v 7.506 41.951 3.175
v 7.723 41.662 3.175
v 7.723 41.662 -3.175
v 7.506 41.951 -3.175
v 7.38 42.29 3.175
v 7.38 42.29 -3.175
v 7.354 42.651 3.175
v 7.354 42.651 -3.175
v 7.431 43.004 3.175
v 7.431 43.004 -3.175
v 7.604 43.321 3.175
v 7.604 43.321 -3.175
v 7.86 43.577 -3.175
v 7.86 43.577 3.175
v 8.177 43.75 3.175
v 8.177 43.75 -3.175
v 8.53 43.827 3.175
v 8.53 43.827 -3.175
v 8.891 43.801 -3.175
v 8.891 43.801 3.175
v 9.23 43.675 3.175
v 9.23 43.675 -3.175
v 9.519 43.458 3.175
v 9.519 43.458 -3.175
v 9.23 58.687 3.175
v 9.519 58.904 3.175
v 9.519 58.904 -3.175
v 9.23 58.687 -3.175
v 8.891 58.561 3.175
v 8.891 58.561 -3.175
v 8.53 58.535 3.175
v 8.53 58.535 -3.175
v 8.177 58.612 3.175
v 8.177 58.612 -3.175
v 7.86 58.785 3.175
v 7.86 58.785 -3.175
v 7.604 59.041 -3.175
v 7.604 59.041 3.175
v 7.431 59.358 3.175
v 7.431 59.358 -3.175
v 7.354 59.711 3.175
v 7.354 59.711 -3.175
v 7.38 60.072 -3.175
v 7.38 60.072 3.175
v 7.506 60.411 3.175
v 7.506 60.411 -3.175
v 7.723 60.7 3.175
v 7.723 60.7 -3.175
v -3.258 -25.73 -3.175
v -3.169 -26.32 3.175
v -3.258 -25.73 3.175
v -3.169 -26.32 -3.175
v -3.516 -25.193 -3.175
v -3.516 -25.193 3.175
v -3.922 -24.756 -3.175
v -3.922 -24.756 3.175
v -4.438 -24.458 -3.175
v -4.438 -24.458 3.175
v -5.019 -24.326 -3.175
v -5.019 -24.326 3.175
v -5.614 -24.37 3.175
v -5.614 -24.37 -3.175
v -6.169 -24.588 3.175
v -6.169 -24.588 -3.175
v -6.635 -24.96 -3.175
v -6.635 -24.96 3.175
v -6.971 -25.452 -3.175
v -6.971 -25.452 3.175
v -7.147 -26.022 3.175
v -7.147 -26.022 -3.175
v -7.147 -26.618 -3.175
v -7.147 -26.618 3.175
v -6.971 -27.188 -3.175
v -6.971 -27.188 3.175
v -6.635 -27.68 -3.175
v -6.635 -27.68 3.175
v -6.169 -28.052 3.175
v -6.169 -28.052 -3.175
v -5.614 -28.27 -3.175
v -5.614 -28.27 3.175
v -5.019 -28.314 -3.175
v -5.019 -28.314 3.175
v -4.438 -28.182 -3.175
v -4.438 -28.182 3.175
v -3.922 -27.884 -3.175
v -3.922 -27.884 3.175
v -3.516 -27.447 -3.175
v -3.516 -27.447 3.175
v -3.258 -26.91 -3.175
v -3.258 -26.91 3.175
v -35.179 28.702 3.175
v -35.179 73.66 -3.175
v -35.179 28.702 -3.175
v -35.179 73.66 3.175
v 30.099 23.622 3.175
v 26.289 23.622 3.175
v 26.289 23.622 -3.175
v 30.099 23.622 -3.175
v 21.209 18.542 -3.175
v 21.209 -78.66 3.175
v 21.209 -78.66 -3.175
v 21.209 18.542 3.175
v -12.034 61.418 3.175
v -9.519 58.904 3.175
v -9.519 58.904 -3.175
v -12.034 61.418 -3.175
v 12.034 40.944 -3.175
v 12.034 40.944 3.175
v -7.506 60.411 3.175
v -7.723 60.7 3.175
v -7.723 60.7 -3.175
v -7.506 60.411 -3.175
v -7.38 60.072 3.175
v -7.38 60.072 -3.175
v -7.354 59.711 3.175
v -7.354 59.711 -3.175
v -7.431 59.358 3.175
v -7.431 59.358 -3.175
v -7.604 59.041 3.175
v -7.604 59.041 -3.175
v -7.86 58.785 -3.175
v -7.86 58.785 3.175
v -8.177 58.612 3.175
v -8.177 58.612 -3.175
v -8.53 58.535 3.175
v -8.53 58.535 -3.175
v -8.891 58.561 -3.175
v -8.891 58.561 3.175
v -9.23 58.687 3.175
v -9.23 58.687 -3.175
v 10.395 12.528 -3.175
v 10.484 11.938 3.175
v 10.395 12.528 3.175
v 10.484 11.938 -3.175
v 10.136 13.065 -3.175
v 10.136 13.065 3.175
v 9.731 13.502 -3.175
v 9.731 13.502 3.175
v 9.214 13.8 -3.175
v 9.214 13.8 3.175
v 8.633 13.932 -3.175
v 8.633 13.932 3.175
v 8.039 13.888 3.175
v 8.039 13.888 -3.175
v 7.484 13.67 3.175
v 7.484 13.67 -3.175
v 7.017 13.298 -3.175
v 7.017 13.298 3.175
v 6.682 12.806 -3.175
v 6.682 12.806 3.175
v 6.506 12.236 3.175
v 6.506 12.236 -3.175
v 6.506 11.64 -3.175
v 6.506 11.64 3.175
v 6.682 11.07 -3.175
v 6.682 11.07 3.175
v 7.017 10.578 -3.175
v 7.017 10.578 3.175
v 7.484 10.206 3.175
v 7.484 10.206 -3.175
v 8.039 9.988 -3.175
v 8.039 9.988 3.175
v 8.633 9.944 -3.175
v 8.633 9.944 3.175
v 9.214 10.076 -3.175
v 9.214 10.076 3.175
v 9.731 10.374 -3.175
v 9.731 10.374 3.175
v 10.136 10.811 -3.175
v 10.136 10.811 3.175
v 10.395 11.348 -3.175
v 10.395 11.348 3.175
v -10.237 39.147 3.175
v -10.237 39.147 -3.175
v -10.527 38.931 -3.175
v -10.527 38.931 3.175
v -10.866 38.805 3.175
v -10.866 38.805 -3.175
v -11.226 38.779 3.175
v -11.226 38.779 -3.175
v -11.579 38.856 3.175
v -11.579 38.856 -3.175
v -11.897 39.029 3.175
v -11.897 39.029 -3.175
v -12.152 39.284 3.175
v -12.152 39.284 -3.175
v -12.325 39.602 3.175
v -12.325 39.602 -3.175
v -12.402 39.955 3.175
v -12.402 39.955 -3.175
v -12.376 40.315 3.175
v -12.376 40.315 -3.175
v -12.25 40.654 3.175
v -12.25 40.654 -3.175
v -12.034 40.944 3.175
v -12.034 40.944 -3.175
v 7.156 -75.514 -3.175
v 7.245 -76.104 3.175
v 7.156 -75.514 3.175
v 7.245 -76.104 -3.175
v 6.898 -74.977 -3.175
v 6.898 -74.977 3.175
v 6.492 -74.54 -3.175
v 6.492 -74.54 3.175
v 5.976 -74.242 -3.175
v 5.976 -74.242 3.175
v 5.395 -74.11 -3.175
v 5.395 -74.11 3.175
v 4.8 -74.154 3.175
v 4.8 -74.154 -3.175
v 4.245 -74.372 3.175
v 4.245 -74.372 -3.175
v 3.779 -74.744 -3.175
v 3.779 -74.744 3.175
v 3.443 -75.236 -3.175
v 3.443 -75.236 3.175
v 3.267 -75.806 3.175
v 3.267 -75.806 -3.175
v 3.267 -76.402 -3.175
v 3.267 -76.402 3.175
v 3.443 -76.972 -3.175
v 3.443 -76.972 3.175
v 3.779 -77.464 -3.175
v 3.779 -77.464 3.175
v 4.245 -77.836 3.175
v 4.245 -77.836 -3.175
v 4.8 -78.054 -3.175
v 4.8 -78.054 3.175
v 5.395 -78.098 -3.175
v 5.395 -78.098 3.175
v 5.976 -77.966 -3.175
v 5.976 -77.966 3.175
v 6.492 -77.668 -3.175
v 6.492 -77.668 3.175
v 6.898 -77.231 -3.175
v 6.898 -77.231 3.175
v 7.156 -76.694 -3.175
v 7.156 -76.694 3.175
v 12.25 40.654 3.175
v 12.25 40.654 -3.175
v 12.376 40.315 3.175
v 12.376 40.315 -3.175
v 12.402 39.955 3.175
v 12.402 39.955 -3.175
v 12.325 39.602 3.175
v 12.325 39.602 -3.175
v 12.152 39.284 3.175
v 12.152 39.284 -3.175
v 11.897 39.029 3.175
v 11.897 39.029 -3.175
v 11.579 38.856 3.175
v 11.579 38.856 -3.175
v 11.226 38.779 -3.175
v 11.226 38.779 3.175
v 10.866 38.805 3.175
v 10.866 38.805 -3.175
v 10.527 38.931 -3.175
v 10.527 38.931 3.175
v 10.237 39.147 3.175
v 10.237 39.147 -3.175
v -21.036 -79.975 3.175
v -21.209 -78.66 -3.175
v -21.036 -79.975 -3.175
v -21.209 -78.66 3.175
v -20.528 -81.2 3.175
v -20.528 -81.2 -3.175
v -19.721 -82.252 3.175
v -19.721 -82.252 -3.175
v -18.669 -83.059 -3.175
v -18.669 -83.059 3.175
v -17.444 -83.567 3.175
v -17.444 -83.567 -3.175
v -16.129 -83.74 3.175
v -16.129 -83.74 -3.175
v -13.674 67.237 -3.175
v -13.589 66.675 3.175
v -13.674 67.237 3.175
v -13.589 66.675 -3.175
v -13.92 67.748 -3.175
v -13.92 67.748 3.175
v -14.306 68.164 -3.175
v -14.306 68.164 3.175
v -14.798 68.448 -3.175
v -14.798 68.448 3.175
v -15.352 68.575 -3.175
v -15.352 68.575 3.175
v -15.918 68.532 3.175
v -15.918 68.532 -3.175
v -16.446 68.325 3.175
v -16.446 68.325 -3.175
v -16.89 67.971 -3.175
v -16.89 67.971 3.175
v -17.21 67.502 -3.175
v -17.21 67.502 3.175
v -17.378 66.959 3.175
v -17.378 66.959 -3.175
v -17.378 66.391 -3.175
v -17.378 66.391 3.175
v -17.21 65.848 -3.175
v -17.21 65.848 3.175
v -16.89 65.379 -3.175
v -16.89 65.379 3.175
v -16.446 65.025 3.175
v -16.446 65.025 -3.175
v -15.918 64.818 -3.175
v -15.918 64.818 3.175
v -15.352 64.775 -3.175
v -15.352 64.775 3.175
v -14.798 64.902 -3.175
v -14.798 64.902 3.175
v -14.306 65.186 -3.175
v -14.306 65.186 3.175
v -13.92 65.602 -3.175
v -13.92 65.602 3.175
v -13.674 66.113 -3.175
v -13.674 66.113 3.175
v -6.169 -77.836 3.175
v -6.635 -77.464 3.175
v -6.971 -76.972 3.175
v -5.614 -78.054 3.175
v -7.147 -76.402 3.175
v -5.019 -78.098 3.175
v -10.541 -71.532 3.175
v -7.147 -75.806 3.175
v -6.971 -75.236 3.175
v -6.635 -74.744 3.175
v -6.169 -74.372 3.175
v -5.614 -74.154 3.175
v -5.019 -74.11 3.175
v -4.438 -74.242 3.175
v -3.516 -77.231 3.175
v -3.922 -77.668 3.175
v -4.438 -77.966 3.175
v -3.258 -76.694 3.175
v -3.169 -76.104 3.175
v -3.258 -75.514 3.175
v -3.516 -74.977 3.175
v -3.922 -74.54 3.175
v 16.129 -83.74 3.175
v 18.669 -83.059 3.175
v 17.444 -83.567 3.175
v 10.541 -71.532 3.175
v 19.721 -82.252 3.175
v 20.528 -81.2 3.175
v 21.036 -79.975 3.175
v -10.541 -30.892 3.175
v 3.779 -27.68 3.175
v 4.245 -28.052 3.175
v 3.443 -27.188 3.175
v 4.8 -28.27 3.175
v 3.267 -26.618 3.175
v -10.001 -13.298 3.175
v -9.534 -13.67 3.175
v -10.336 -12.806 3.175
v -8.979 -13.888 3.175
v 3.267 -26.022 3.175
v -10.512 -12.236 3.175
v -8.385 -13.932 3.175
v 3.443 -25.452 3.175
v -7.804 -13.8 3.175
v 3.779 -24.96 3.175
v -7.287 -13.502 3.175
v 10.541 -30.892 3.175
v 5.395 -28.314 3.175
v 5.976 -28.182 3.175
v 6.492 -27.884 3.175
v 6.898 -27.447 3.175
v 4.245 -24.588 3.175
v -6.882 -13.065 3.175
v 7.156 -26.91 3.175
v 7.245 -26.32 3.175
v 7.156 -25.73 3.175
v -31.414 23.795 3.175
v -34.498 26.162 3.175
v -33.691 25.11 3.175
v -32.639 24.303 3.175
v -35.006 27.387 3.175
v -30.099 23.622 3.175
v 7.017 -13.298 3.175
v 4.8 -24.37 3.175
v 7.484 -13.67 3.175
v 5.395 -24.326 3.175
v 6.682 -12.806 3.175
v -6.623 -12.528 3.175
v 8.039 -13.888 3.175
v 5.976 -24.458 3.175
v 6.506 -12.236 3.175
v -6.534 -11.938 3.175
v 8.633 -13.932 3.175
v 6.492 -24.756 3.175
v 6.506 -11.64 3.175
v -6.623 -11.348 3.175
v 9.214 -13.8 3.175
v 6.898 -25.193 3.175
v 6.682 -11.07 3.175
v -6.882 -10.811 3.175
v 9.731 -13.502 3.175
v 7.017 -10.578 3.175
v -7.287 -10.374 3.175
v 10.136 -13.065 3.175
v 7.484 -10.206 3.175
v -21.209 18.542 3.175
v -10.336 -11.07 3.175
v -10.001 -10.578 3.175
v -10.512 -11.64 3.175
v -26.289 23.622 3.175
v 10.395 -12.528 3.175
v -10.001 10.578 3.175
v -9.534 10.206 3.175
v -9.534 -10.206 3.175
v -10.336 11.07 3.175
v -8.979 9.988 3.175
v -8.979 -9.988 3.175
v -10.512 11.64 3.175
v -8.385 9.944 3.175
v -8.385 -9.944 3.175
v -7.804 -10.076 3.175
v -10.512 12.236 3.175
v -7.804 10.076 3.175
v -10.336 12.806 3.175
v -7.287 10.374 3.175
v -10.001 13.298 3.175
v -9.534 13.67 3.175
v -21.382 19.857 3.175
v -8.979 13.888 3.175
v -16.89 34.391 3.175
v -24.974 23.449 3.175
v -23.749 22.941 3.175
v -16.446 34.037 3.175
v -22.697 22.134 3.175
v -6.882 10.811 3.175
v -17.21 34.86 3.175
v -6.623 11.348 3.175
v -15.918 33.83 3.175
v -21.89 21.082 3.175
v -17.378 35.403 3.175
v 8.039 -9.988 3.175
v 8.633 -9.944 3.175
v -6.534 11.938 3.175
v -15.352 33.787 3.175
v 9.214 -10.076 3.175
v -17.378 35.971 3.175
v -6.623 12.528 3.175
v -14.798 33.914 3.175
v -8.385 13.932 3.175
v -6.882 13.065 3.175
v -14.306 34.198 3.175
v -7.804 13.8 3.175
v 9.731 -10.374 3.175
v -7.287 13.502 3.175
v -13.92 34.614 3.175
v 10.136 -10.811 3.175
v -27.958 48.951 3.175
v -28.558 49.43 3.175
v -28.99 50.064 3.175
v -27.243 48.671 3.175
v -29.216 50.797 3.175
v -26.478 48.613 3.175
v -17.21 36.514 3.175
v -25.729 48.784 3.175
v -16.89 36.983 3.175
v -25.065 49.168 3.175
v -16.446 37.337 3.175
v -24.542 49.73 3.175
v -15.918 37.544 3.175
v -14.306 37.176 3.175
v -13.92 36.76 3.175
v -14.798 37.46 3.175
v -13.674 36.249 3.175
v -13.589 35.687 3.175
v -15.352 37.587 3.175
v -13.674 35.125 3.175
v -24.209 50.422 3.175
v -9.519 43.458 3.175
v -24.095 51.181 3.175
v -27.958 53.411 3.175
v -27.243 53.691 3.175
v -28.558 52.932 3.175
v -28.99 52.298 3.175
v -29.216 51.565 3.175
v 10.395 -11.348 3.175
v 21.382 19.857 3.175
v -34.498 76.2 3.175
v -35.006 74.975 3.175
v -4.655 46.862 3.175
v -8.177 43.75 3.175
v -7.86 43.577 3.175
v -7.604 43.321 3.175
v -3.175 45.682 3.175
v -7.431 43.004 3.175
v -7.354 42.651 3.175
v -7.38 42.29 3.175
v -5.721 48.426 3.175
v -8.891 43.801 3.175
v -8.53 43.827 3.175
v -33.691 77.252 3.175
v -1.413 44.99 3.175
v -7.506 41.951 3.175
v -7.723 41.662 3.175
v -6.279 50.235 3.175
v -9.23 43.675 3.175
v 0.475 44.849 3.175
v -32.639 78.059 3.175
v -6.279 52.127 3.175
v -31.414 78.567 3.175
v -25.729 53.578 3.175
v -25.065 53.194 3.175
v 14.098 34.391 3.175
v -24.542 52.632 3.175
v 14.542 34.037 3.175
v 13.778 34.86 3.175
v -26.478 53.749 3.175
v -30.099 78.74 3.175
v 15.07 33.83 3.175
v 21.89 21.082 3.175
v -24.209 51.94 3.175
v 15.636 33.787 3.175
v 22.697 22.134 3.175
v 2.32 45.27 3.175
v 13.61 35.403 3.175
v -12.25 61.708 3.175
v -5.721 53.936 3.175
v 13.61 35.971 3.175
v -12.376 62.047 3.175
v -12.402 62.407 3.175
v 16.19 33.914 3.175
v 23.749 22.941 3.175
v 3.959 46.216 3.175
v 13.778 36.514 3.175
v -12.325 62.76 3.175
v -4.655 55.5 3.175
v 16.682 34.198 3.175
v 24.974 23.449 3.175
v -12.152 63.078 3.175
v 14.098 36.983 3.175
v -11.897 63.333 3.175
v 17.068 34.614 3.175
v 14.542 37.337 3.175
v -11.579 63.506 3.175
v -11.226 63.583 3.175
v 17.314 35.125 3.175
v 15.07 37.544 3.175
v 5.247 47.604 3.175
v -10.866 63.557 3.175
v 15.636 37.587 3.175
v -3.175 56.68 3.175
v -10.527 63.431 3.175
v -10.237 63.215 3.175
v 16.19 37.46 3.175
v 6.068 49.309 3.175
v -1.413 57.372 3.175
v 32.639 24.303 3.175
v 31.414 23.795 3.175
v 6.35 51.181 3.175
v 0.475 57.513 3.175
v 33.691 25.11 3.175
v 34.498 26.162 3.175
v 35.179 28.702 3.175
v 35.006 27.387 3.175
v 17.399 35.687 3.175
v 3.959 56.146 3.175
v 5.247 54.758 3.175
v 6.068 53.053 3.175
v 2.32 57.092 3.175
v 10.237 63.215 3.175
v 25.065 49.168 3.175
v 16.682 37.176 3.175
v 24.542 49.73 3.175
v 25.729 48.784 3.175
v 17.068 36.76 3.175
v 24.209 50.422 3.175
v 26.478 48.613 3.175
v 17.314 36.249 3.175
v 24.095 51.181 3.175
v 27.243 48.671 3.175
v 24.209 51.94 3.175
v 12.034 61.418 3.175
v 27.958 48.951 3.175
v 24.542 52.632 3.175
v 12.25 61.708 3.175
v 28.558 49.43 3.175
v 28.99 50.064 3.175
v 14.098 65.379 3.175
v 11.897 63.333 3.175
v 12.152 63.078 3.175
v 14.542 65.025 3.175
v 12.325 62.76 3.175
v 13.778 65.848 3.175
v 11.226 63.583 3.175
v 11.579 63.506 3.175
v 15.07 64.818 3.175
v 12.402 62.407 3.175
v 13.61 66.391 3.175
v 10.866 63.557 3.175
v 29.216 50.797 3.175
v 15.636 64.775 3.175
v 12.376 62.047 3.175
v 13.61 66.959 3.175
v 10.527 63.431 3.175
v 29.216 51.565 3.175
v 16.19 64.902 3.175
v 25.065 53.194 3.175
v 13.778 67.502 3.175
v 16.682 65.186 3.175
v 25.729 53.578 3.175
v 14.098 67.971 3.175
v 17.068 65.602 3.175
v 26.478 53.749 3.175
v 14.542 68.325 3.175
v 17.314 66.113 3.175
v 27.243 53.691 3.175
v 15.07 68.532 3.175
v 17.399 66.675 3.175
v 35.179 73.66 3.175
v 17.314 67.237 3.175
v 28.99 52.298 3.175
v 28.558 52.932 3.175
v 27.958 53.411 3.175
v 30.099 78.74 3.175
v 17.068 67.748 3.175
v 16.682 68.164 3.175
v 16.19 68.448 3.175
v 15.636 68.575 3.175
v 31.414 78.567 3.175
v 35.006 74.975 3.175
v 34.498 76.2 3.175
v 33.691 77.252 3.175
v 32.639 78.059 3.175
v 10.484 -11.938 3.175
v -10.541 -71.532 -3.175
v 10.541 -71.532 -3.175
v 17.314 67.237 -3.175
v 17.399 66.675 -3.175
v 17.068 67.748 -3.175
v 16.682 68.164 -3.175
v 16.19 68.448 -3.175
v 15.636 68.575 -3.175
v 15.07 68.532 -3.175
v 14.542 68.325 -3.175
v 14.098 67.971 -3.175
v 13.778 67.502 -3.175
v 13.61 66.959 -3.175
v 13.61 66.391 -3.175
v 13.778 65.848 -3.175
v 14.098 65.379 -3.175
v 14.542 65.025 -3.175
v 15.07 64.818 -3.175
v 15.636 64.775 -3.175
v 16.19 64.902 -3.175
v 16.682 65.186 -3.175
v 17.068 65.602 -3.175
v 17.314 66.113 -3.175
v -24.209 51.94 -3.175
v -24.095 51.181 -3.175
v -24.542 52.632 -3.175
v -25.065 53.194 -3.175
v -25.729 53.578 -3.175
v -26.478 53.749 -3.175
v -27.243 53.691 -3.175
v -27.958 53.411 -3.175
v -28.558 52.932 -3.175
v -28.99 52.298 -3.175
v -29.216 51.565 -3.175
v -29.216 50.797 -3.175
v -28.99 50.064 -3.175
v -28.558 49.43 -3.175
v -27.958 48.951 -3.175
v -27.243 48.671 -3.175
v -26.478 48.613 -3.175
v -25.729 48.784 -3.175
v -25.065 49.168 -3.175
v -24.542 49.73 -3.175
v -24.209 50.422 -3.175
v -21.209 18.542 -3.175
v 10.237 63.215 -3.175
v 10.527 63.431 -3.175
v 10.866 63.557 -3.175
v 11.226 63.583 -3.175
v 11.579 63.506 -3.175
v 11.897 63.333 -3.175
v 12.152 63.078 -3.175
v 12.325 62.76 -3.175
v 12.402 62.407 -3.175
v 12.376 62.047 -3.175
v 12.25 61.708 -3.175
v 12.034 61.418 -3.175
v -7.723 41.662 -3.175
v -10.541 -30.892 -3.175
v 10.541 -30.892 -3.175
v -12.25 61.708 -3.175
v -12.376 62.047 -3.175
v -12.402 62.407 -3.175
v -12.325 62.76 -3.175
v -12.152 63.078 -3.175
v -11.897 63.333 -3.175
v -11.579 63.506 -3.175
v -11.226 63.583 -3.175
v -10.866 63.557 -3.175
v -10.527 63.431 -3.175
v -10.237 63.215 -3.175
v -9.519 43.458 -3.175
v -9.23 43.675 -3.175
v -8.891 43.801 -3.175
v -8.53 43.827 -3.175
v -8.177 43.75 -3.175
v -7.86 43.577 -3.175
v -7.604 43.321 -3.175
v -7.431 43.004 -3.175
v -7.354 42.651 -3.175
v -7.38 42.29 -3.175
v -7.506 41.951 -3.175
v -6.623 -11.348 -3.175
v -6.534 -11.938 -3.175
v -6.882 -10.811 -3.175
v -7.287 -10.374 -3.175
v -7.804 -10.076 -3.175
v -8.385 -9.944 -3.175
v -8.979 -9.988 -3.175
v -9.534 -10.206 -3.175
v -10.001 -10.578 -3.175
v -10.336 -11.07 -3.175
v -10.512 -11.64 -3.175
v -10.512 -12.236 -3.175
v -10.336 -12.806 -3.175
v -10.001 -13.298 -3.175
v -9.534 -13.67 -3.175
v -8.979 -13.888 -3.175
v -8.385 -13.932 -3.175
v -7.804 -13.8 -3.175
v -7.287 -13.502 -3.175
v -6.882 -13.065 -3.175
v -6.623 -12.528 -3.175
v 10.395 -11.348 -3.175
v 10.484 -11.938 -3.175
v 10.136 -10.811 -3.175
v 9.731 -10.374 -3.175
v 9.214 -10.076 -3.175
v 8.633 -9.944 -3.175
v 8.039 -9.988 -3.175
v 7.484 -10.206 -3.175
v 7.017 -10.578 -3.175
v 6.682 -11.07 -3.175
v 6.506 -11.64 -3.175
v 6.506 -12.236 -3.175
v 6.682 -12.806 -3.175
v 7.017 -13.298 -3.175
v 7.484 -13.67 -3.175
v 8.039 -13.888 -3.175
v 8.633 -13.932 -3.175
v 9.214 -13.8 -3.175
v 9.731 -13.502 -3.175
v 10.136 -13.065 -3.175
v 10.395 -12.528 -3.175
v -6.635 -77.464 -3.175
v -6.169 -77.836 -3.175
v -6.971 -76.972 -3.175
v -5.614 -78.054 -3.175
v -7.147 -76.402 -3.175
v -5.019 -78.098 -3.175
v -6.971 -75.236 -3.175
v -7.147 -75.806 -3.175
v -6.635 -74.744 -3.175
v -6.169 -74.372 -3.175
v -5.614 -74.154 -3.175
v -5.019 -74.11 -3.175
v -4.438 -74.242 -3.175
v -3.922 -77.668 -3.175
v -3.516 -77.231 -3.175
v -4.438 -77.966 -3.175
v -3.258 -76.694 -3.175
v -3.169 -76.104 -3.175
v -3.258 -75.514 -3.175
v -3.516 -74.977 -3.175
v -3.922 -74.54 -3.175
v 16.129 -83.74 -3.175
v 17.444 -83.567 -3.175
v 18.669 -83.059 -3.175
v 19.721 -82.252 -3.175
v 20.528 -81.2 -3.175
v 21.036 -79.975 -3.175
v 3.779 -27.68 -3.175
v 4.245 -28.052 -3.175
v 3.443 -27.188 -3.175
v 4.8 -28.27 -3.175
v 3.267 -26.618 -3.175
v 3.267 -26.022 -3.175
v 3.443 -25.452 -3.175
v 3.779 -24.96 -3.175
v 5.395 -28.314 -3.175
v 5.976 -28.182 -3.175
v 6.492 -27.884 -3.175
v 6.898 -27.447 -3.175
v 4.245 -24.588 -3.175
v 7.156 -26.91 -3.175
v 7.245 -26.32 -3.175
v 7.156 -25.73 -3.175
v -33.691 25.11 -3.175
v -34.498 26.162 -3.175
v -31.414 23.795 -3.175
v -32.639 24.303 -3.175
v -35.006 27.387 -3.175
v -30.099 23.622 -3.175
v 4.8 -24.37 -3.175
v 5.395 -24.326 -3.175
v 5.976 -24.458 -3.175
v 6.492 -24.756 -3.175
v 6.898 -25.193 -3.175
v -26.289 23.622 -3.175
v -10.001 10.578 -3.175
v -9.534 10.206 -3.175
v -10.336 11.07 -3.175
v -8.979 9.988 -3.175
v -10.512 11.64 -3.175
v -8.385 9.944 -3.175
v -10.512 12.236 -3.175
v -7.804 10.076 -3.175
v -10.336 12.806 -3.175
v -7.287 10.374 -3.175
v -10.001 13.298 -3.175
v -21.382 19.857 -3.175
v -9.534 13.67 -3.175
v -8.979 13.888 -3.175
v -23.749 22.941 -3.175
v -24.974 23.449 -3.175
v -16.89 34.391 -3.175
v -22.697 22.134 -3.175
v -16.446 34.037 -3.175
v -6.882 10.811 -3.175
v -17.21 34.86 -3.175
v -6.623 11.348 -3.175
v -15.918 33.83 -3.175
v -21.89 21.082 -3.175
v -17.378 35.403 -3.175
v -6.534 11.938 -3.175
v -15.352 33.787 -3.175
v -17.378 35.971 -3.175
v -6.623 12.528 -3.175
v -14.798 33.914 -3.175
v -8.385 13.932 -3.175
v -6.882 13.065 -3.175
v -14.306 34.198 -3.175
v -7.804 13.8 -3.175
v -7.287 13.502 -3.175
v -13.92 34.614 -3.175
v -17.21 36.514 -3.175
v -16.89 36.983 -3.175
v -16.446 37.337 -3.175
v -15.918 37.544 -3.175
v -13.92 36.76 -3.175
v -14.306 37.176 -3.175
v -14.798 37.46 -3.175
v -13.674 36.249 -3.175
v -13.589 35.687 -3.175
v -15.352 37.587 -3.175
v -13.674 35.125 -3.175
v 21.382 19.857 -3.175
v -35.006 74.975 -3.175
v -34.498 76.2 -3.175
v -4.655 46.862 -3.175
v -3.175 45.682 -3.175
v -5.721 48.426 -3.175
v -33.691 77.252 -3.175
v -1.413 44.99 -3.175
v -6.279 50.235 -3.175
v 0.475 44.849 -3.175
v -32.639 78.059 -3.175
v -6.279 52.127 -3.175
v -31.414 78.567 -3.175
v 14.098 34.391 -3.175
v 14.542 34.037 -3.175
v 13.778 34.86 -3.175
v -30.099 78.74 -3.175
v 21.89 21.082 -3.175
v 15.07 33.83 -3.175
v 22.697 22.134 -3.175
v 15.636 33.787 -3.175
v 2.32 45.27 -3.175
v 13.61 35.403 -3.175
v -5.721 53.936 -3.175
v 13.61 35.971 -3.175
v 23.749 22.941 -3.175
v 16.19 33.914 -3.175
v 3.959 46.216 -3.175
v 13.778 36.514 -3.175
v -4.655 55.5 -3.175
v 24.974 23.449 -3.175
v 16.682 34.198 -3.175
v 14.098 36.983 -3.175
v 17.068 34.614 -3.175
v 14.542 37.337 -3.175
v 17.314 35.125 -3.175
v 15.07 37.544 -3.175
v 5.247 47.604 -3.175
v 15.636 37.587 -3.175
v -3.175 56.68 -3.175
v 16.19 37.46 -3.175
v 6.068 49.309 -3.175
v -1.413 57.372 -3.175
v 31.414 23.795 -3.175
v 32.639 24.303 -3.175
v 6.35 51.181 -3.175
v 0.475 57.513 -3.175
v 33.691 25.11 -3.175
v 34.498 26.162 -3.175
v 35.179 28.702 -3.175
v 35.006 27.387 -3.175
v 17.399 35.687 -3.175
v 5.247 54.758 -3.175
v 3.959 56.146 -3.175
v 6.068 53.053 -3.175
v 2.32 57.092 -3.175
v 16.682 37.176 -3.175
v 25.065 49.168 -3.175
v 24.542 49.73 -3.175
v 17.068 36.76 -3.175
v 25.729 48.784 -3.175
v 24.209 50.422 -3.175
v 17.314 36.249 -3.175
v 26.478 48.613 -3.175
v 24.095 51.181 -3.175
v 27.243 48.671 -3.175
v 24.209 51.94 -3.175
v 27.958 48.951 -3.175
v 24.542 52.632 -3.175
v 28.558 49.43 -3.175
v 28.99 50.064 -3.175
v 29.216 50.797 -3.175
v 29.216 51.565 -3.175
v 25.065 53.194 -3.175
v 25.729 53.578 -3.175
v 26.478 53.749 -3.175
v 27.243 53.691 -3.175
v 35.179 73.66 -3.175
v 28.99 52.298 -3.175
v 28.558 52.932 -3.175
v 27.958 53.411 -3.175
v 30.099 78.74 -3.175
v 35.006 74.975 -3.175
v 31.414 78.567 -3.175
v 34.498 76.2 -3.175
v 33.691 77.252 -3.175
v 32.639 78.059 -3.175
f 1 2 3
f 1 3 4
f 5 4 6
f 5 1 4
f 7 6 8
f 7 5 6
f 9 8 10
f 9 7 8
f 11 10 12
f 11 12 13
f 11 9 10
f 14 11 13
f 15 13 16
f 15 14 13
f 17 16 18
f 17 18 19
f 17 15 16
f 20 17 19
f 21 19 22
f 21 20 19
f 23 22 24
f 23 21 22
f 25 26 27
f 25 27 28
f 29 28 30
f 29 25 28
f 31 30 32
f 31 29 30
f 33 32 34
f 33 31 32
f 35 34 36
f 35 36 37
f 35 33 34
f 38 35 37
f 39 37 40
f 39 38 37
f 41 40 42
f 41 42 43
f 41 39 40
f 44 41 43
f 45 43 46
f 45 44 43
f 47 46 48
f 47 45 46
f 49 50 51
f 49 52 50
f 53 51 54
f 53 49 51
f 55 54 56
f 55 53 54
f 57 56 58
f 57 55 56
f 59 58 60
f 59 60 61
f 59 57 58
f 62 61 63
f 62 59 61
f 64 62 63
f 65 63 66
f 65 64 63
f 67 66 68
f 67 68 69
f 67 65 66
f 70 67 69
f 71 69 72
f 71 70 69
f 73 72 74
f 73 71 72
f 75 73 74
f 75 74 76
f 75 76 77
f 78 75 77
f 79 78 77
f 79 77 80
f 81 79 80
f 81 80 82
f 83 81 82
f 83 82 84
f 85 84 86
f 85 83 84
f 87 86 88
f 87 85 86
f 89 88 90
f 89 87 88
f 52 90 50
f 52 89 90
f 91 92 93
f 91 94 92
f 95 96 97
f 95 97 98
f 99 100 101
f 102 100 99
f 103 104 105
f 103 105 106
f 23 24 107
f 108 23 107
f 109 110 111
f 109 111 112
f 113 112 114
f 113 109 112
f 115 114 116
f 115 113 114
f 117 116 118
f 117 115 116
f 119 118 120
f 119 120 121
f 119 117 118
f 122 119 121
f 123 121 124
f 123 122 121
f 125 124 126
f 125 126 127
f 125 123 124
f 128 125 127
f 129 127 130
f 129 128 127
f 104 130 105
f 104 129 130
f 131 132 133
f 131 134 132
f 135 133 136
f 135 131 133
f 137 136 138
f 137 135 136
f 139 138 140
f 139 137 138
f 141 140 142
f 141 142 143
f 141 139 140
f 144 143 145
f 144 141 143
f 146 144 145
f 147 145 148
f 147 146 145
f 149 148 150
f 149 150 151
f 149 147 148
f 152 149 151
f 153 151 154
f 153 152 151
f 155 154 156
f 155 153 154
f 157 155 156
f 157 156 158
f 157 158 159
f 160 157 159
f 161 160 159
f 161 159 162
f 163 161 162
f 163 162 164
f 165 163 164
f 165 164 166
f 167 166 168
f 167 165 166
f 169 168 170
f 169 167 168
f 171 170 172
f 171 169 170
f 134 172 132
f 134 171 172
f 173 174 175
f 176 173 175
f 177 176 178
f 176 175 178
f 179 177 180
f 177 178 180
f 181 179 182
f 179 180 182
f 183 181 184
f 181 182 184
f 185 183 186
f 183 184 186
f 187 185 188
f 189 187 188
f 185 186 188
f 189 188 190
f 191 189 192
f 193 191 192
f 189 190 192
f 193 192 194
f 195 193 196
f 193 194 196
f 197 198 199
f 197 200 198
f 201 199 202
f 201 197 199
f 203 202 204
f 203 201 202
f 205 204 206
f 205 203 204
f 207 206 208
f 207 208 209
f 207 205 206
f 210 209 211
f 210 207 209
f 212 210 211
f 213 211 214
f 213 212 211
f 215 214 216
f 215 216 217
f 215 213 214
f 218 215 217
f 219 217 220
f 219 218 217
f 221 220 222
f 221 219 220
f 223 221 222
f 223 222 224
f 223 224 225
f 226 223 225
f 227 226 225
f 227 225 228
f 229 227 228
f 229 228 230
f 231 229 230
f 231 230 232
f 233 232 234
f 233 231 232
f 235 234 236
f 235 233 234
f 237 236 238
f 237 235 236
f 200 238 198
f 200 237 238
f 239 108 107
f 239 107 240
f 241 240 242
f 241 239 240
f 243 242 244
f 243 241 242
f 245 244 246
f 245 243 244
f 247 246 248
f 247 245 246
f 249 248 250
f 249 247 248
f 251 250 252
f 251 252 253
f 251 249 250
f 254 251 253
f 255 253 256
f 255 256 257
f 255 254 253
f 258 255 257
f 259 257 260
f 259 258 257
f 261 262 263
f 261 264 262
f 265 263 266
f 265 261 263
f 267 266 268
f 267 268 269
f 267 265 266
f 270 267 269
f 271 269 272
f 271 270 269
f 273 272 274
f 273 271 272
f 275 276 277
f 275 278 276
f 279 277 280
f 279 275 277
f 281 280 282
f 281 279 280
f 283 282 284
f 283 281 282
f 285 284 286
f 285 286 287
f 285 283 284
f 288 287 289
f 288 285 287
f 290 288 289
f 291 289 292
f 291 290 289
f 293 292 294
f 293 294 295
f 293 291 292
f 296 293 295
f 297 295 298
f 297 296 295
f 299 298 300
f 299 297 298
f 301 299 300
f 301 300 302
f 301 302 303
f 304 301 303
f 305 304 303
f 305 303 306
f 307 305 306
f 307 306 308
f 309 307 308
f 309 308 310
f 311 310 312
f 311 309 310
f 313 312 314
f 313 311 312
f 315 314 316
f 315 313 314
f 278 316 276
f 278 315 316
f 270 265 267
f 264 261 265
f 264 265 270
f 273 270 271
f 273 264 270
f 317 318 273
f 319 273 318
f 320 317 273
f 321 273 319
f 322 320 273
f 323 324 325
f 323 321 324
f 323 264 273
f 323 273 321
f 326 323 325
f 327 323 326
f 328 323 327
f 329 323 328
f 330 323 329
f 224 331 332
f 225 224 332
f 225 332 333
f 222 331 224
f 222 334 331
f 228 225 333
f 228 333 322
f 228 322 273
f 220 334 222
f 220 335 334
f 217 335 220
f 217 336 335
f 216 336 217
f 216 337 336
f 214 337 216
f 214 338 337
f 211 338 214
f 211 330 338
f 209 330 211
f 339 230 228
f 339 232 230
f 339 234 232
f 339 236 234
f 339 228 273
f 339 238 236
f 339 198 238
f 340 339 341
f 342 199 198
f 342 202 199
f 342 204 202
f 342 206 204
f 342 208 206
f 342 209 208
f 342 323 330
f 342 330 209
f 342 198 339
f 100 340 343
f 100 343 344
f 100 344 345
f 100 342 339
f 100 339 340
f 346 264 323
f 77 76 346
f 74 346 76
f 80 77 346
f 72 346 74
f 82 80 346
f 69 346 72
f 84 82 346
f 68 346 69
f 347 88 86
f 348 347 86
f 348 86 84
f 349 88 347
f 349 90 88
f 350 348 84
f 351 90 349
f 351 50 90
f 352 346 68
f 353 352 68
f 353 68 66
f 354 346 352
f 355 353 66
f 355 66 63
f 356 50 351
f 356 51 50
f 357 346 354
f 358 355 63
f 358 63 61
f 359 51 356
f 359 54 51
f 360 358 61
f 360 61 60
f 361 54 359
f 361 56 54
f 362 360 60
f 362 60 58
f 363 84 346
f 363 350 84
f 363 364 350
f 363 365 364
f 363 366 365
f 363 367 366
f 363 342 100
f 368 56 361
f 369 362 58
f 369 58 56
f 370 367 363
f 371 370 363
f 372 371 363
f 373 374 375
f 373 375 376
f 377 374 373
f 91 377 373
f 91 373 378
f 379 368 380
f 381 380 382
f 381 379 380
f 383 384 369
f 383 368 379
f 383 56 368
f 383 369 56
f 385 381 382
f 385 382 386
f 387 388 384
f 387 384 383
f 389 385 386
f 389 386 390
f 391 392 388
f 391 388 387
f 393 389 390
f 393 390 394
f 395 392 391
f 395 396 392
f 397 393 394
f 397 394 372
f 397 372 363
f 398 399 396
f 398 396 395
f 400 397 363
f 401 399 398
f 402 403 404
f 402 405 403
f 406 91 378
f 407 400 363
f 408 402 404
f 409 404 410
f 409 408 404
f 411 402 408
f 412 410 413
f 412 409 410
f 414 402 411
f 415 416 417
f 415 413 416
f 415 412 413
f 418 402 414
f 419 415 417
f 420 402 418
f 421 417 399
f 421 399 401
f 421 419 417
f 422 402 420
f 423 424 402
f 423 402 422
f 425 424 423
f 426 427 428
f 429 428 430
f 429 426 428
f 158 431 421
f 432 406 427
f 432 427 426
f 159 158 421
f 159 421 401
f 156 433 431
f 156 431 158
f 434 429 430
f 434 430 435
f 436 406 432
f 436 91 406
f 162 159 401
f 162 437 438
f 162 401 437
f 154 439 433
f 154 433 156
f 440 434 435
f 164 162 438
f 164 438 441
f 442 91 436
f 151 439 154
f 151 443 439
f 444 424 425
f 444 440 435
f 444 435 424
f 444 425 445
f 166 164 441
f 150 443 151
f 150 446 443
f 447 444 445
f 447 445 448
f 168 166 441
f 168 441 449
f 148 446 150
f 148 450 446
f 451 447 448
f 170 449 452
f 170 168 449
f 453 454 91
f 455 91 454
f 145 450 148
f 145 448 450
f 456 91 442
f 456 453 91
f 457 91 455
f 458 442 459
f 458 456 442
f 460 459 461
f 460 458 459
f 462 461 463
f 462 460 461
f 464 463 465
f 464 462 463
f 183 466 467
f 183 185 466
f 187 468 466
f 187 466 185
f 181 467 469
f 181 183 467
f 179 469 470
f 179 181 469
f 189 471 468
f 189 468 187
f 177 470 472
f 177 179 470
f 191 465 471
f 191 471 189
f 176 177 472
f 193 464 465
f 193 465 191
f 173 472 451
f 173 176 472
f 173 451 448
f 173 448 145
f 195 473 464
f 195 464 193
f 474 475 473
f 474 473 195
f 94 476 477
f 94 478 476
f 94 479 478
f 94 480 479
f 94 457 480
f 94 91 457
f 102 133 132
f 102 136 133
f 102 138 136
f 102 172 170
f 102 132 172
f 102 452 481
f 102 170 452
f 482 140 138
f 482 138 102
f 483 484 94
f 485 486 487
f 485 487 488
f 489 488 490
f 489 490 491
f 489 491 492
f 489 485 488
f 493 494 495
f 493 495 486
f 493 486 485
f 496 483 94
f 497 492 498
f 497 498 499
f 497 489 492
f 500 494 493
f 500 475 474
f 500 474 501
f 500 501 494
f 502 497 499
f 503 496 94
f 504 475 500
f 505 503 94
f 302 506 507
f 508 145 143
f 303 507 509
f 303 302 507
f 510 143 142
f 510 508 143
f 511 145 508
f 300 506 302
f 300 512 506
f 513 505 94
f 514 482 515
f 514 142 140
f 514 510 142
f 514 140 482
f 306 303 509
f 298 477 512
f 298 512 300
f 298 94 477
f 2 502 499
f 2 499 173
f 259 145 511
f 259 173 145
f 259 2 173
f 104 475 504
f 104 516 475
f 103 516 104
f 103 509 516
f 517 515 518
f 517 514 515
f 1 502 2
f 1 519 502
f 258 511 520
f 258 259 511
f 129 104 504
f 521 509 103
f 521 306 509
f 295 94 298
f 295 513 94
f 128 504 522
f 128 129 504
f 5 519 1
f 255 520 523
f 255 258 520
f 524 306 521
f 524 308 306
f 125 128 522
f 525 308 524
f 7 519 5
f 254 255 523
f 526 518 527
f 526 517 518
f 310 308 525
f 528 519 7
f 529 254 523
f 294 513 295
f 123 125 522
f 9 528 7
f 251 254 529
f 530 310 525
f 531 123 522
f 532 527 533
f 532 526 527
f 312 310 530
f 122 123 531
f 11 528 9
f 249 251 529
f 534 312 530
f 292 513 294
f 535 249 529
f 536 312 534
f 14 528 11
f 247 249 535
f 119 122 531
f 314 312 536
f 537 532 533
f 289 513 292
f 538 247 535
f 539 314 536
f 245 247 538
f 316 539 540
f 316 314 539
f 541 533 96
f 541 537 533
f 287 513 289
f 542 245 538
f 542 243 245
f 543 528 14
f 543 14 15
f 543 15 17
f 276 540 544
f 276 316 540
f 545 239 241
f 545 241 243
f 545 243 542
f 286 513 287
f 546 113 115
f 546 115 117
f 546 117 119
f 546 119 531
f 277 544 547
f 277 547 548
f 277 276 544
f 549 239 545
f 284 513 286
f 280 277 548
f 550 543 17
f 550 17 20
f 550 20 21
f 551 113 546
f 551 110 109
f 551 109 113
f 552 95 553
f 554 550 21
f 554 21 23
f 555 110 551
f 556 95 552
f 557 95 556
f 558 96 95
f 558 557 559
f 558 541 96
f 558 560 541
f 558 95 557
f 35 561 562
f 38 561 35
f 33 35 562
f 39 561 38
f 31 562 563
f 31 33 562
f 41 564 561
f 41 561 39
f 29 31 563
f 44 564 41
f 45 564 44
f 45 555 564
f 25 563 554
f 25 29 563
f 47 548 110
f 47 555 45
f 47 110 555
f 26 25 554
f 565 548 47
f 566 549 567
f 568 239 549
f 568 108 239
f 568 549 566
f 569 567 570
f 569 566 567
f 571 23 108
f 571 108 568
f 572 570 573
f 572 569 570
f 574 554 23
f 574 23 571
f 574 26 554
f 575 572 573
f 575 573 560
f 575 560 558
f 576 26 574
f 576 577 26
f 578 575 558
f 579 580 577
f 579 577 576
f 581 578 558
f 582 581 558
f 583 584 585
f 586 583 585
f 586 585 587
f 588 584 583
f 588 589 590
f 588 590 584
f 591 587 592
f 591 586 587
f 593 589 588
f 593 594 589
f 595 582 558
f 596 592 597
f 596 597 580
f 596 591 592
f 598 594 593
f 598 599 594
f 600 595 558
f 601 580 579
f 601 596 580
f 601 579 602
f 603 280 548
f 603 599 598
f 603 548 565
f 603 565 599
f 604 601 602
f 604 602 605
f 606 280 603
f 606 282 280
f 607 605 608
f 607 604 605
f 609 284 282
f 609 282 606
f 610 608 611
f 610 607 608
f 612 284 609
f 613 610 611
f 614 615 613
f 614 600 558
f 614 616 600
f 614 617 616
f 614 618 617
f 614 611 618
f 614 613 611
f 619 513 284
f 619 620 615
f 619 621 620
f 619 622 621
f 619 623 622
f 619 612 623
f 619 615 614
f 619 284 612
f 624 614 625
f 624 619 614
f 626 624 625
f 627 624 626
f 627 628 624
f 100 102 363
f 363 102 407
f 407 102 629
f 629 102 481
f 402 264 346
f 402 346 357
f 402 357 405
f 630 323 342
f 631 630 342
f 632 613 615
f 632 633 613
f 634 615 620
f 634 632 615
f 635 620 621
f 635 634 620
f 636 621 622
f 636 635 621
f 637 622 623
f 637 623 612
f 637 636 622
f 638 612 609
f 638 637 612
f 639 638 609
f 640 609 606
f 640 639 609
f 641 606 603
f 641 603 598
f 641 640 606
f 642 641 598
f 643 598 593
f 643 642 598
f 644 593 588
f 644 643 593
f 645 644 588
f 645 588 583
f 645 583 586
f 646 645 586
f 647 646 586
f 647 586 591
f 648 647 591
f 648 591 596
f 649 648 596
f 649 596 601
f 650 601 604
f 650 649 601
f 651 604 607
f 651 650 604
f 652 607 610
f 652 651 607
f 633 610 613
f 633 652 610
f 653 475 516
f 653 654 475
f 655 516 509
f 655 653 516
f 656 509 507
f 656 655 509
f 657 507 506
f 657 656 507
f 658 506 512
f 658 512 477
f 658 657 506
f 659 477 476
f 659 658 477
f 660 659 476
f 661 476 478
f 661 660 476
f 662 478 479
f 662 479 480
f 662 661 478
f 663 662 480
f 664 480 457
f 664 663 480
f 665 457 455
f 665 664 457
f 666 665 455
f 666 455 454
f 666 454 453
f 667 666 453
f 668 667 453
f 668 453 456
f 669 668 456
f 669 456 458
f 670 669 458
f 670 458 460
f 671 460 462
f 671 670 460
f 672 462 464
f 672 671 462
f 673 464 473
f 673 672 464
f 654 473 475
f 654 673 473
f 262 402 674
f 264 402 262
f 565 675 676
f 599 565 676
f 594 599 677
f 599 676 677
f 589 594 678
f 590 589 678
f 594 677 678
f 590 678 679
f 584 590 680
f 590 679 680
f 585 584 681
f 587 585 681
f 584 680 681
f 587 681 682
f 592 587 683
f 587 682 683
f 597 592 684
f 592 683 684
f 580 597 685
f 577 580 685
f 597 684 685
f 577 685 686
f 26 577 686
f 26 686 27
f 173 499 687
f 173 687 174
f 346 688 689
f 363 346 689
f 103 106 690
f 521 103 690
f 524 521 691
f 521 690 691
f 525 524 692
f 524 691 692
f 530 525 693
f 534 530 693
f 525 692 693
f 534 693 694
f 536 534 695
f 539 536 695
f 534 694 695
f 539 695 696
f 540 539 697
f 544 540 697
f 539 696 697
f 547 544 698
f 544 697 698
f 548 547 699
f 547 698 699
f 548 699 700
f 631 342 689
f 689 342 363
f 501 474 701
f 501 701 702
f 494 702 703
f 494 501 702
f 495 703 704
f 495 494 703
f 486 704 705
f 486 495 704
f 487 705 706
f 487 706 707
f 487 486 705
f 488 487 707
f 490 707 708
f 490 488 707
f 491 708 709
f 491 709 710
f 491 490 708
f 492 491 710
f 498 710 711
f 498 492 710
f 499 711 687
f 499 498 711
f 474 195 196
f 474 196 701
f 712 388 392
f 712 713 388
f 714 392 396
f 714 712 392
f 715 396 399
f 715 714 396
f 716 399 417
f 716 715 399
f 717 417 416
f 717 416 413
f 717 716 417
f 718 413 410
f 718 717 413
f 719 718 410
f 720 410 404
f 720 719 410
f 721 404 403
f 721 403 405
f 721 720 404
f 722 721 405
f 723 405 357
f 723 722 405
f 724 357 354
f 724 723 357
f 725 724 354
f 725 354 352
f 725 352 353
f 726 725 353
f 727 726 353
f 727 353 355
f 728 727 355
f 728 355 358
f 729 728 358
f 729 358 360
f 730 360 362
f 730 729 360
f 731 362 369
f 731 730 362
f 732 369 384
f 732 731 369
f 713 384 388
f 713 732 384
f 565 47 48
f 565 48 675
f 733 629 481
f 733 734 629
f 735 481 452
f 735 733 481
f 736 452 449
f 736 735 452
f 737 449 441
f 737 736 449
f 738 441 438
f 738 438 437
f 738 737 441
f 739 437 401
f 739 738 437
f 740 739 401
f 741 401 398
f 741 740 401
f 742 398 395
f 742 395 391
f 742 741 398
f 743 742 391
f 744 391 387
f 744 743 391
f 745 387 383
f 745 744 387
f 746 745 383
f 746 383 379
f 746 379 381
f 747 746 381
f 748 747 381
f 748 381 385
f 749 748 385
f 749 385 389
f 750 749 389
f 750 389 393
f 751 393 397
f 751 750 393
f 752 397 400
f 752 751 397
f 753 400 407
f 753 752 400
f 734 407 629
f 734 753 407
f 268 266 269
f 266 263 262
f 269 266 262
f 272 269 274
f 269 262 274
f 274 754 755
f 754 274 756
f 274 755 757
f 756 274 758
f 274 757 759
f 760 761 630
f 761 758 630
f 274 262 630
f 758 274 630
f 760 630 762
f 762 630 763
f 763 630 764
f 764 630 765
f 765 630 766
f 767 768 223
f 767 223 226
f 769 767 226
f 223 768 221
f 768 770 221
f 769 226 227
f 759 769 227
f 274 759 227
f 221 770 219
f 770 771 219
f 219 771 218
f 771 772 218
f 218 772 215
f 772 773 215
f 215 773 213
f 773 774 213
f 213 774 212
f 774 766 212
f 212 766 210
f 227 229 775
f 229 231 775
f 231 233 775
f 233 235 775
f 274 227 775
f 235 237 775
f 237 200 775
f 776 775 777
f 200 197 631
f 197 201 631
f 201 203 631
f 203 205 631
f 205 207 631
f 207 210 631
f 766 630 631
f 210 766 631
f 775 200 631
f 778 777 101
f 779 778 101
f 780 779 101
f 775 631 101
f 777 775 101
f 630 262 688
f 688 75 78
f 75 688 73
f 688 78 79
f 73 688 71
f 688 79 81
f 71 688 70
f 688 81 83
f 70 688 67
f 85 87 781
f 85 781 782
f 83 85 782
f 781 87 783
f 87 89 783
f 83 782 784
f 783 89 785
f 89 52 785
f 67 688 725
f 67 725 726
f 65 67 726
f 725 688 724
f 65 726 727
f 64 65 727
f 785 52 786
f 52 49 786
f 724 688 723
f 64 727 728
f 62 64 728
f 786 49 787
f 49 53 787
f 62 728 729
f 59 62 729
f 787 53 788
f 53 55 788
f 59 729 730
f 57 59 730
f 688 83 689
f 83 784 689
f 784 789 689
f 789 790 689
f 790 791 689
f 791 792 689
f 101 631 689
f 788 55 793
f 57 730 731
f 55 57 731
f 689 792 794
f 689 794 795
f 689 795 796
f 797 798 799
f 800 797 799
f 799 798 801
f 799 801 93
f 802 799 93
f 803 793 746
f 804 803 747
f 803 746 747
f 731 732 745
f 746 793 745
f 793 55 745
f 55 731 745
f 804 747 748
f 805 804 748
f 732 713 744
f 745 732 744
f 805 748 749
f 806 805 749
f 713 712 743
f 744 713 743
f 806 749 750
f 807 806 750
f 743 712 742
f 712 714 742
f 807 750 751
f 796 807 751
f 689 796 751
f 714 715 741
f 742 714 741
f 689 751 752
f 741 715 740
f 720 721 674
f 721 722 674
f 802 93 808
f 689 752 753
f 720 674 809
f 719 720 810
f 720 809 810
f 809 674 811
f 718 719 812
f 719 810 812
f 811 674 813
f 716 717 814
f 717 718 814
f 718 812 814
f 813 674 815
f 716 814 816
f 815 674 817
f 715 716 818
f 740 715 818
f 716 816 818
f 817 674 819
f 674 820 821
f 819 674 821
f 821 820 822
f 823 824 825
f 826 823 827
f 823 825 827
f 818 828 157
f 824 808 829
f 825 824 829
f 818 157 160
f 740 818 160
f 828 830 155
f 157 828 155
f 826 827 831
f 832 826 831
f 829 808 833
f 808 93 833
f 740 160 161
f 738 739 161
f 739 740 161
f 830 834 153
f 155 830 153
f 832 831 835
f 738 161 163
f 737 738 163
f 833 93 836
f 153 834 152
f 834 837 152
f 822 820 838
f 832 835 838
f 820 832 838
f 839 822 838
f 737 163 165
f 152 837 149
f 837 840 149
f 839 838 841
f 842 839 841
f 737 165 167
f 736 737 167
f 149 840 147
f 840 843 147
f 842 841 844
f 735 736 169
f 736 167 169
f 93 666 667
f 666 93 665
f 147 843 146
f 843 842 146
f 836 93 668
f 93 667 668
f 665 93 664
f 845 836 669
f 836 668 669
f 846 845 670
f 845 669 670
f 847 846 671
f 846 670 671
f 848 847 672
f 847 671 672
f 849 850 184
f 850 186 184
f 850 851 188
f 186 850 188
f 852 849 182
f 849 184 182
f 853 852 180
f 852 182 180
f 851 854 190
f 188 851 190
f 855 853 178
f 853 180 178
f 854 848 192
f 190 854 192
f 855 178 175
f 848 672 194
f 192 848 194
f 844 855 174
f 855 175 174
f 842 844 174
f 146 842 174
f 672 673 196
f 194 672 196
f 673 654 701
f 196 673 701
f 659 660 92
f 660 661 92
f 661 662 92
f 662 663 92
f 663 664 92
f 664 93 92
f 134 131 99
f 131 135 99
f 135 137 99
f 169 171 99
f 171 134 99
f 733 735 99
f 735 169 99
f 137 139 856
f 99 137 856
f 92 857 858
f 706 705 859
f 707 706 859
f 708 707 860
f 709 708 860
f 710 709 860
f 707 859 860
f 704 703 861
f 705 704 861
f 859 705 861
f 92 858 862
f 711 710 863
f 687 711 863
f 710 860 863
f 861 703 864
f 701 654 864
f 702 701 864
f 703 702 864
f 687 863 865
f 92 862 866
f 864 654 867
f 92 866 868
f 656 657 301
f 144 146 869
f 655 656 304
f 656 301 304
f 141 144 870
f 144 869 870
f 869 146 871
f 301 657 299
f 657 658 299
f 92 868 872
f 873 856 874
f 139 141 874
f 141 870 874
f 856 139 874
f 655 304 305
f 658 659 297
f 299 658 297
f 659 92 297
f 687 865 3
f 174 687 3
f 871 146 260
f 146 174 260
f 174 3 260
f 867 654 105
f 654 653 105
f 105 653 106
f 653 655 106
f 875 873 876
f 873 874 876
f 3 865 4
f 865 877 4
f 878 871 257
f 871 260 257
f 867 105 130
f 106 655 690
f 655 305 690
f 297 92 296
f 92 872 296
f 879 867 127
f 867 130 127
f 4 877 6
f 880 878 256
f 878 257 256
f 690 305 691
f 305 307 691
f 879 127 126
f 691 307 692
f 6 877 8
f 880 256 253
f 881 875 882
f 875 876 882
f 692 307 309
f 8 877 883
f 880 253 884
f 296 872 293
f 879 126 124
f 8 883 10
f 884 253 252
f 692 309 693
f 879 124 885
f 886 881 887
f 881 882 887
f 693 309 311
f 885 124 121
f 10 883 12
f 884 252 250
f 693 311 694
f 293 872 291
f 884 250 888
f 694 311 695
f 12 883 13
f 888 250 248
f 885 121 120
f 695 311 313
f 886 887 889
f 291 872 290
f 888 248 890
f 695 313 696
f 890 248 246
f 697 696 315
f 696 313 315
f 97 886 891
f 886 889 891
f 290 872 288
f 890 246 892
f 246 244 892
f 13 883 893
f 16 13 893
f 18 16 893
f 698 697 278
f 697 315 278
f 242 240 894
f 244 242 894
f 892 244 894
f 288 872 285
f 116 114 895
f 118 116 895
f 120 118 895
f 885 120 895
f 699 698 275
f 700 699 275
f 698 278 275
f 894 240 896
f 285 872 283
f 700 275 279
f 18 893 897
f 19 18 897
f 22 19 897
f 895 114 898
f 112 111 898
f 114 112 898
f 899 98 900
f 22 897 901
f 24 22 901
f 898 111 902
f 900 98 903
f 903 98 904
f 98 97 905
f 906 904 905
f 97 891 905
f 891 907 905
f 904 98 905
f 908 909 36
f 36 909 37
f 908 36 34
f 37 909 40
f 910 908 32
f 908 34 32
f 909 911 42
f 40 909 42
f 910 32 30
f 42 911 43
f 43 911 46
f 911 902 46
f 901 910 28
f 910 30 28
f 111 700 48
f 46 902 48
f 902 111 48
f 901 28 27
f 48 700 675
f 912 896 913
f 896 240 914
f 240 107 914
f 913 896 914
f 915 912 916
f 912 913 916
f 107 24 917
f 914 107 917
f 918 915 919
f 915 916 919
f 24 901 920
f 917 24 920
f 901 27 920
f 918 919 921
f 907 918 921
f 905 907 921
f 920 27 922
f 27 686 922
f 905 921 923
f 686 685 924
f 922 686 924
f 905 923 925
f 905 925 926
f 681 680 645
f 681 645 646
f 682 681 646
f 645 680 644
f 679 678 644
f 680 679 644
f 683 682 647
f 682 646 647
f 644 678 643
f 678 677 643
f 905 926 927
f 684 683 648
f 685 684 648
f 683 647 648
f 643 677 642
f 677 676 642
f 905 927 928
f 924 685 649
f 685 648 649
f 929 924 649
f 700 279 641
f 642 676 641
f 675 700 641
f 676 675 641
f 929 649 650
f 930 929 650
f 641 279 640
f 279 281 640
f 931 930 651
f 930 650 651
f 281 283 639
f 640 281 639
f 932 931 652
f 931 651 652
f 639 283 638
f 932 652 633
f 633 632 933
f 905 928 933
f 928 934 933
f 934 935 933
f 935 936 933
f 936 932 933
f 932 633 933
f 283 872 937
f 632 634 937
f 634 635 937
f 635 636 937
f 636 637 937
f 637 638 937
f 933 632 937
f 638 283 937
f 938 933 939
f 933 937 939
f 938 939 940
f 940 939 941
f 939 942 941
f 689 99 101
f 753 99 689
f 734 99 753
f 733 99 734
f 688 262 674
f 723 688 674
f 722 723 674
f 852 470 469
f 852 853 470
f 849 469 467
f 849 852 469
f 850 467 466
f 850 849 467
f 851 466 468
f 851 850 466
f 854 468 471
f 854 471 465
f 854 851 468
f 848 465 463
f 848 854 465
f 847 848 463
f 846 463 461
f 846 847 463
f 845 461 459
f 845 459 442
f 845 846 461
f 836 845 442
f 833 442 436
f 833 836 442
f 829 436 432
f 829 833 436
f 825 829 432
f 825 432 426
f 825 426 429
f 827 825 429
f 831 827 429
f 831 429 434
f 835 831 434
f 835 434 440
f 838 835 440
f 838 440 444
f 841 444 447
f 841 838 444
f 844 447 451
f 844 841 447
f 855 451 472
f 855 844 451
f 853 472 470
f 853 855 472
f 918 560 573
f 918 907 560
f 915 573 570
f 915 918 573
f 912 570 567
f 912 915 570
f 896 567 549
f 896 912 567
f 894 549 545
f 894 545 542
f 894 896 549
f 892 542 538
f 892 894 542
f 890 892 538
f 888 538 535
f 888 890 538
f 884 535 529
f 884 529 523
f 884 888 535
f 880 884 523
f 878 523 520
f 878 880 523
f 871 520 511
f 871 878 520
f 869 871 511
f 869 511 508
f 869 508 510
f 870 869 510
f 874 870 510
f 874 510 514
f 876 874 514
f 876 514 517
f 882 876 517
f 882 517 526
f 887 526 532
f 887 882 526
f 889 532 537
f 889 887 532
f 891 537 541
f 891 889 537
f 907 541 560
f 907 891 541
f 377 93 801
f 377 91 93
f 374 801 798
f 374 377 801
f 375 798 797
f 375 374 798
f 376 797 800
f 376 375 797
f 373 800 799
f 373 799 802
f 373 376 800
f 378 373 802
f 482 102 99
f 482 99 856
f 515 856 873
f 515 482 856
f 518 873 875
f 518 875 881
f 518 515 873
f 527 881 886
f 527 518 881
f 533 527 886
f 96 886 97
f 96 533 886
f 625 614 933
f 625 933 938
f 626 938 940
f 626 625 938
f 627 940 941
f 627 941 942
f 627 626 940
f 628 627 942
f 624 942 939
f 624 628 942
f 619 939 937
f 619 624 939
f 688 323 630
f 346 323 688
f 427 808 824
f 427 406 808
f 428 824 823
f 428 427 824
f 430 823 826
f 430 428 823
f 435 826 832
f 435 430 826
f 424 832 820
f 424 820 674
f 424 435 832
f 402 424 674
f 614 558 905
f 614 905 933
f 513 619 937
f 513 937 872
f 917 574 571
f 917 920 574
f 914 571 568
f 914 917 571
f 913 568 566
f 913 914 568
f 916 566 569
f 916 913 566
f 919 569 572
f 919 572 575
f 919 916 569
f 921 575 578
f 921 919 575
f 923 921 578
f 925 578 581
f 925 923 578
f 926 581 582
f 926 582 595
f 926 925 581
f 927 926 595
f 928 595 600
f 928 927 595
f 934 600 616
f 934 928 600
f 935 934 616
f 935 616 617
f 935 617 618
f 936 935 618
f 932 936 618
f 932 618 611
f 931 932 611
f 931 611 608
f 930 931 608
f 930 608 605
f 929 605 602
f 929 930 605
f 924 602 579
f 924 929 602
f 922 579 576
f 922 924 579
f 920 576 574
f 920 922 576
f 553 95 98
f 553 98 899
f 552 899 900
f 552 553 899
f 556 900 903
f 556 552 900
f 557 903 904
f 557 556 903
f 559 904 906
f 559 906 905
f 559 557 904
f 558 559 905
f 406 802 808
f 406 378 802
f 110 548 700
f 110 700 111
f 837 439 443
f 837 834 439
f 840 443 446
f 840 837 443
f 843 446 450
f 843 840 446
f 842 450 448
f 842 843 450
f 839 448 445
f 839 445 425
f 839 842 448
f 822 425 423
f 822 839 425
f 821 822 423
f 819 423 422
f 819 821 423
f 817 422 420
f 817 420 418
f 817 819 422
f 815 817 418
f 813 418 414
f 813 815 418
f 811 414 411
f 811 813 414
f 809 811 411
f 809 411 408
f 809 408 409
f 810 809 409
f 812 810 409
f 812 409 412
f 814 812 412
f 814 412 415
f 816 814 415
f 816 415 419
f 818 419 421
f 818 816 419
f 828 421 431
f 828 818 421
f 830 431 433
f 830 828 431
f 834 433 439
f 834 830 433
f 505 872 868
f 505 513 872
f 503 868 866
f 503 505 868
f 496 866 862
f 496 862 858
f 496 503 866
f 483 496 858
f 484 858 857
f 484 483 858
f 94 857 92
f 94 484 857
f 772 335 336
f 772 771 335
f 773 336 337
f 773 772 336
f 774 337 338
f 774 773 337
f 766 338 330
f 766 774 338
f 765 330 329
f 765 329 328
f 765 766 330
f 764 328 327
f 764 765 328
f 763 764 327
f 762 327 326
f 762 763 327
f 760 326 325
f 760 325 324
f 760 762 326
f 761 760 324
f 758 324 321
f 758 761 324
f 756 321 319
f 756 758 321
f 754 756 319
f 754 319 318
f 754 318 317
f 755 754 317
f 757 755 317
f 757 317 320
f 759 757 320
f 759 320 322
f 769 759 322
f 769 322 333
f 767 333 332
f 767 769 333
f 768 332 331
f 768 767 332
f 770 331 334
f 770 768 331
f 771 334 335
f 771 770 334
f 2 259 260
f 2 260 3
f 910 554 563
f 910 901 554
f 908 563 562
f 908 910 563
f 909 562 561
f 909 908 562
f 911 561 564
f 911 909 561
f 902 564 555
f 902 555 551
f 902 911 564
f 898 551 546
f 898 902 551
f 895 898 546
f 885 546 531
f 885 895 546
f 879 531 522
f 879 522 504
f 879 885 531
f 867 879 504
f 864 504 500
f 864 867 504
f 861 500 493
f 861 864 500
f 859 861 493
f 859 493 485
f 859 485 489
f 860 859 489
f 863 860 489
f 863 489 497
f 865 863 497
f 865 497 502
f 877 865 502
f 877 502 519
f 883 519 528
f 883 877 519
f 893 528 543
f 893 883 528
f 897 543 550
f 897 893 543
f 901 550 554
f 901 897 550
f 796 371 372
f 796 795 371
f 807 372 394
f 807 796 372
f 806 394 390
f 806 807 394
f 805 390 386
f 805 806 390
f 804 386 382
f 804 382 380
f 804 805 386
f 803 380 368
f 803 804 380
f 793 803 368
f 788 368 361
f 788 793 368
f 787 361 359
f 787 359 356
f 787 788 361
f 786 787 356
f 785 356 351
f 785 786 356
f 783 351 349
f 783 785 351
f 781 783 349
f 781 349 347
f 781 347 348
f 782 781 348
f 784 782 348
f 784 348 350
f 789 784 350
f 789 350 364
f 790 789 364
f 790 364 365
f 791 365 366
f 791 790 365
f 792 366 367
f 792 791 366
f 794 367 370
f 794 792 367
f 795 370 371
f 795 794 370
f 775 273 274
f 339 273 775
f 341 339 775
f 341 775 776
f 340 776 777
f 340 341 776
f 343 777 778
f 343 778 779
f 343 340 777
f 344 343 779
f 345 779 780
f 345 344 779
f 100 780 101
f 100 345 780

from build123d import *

# Parameters (mm, degrees)
SKETCH1_R           = 2
SKETCH1_R_2         = 6.35
SKETCH1_R_3         = 1.905
SKETCH1_R_4         = 2.575
SKETCH1_W           = 21.082
SKETCH1_H           = 40.64
BOSS_EXTRUDE1_DEPTH = 3.175


with BuildPart() as part:
    # Sketch1 → Boss-Extrude1 (new, symmetric)
    with BuildSketch(Plane.XY):
        with BuildLine():
            Line((-16.129, -83.74), (16.129, -83.74))
            ThreePointArc((16.129, -83.74), (19.721102448, -82.252102448), (21.209, -78.66))
            Line((21.209, -78.66), (21.209, 18.542))
            ThreePointArc((21.209, 18.542), (22.696897552, 22.134102448), (26.289, 23.622))
            Line((26.289, 23.622), (30.099, 23.622))
            ThreePointArc((30.099, 23.622), (33.691102448, 25.109897552), (35.179, 28.702))
            Line((35.179, 28.702), (35.179, 73.66))
            ThreePointArc((35.179, 73.66), (33.691102448, 77.252102448), (30.099, 78.74))
            Line((30.099, 78.74), (-30.099, 78.74))
            ThreePointArc((-30.099, 78.74), (-33.691102448, 77.252102448), (-35.179, 73.66))
            Line((-35.179, 73.66), (-35.179, 28.702))
            ThreePointArc((-35.179, 28.702), (-33.691102448, 25.109897552), (-30.099, 23.622))
            Line((-30.099, 23.622), (-26.289, 23.622))
            ThreePointArc((-26.289, 23.622), (-22.696897552, 22.134102448), (-21.209, 18.542))
            Line((-21.209, 18.542), (-21.209, -78.66))
            ThreePointArc((-21.209, -78.66), (-19.721102448, -82.252102448), (-16.129, -83.74))
        make_face()
        with Locations((8.4836, 11.938)):
            Circle(SKETCH1_R, mode=Mode.SUBTRACT)
        with Locations((-8.5344, 11.938)):
            Circle(SKETCH1_R, mode=Mode.SUBTRACT)
        with Locations((-8.5344, -11.938)):
            Circle(SKETCH1_R, mode=Mode.SUBTRACT)
        with Locations((8.4836, -11.938)):
            Circle(SKETCH1_R, mode=Mode.SUBTRACT)
        with Locations((0, 51.181)):
            Circle(SKETCH1_R_2, mode=Mode.SUBTRACT)
        with Locations((15.494, 66.675)):
            Circle(SKETCH1_R_3, mode=Mode.SUBTRACT)
        with Locations((-15.494, 66.675)):
            Circle(SKETCH1_R_3, mode=Mode.SUBTRACT)
        with Locations((-15.494, 35.687)):
            Circle(SKETCH1_R_3, mode=Mode.SUBTRACT)
        with Locations((15.494, 35.687)):
            Circle(SKETCH1_R_3, mode=Mode.SUBTRACT)
        with Locations((-5.1689, -26.32)):
            Circle(SKETCH1_R, mode=Mode.SUBTRACT)
        with Locations((5.2451, -26.32)):
            Circle(SKETCH1_R, mode=Mode.SUBTRACT)
        with Locations((5.2451, -76.104)):
            Circle(SKETCH1_R, mode=Mode.SUBTRACT)
        with Locations((-5.1689, -76.104)):
            Circle(SKETCH1_R, mode=Mode.SUBTRACT)
        with Locations((-26.67, 51.181)):
            Circle(SKETCH1_R_4, mode=Mode.SUBTRACT)
        with Locations(Location((26.67, 51.181, 0), (0, 0, 180))):
            Circle(SKETCH1_R_4, mode=Mode.SUBTRACT)
        with BuildLine():
            Line((7.723020264, 60.700071488), (10.237491978, 63.214543202))
            ThreePointArc((10.237491978, 63.214543202), (12.033543202, 63.214543202), (12.033543202, 61.418491978))
            Line((12.033543202, 61.418491978), (9.519071488, 58.904020264))
            ThreePointArc((9.519071488, 58.904020264), (7.723020264, 58.904020264), (7.723020264, 60.700071488))
        make_face(mode=Mode.SUBTRACT)
        with BuildLine():
            Line((-9.519071488, 58.904020264), (-12.033543202, 61.418491978))
            ThreePointArc((-12.033543202, 61.418491978), (-12.033543202, 63.214543202), (-10.237491978, 63.214543202))
            Line((-10.237491978, 63.214543202), (-7.723020264, 60.700071488))
            ThreePointArc((-7.723020264, 60.700071488), (-7.723020264, 58.904020264), (-9.519071488, 58.904020264))
        make_face(mode=Mode.SUBTRACT)
        with Locations((0, -51.212)):
            Rectangle(SKETCH1_W, SKETCH1_H, mode=Mode.SUBTRACT)
        with BuildLine():
            Line((-7.723020264, 41.661928512), (-10.237491978, 39.147456798))
            ThreePointArc((-10.237491978, 39.147456798), (-12.033543202, 39.147456798), (-12.033543202, 40.943508022))
            Line((-12.033543202, 40.943508022), (-9.519071488, 43.457979736))
            ThreePointArc((-9.519071488, 43.457979736), (-7.723020264, 43.457979736), (-7.723020264, 41.661928512))
        make_face(mode=Mode.SUBTRACT)
        with BuildLine():
            Line((9.519071488, 43.457979736), (12.033543202, 40.943508022))
            ThreePointArc((12.033543202, 40.943508022), (12.033543202, 39.147456798), (10.237491978, 39.147456798))
            Line((10.237491978, 39.147456798), (7.723020264, 41.661928512))
            ThreePointArc((7.723020264, 41.661928512), (7.723020264, 43.457979736), (9.519071488, 43.457979736))
        make_face(mode=Mode.SUBTRACT)
    extrude(amount=BOSS_EXTRUDE1_DEPTH, both=True)


solid = part.part
